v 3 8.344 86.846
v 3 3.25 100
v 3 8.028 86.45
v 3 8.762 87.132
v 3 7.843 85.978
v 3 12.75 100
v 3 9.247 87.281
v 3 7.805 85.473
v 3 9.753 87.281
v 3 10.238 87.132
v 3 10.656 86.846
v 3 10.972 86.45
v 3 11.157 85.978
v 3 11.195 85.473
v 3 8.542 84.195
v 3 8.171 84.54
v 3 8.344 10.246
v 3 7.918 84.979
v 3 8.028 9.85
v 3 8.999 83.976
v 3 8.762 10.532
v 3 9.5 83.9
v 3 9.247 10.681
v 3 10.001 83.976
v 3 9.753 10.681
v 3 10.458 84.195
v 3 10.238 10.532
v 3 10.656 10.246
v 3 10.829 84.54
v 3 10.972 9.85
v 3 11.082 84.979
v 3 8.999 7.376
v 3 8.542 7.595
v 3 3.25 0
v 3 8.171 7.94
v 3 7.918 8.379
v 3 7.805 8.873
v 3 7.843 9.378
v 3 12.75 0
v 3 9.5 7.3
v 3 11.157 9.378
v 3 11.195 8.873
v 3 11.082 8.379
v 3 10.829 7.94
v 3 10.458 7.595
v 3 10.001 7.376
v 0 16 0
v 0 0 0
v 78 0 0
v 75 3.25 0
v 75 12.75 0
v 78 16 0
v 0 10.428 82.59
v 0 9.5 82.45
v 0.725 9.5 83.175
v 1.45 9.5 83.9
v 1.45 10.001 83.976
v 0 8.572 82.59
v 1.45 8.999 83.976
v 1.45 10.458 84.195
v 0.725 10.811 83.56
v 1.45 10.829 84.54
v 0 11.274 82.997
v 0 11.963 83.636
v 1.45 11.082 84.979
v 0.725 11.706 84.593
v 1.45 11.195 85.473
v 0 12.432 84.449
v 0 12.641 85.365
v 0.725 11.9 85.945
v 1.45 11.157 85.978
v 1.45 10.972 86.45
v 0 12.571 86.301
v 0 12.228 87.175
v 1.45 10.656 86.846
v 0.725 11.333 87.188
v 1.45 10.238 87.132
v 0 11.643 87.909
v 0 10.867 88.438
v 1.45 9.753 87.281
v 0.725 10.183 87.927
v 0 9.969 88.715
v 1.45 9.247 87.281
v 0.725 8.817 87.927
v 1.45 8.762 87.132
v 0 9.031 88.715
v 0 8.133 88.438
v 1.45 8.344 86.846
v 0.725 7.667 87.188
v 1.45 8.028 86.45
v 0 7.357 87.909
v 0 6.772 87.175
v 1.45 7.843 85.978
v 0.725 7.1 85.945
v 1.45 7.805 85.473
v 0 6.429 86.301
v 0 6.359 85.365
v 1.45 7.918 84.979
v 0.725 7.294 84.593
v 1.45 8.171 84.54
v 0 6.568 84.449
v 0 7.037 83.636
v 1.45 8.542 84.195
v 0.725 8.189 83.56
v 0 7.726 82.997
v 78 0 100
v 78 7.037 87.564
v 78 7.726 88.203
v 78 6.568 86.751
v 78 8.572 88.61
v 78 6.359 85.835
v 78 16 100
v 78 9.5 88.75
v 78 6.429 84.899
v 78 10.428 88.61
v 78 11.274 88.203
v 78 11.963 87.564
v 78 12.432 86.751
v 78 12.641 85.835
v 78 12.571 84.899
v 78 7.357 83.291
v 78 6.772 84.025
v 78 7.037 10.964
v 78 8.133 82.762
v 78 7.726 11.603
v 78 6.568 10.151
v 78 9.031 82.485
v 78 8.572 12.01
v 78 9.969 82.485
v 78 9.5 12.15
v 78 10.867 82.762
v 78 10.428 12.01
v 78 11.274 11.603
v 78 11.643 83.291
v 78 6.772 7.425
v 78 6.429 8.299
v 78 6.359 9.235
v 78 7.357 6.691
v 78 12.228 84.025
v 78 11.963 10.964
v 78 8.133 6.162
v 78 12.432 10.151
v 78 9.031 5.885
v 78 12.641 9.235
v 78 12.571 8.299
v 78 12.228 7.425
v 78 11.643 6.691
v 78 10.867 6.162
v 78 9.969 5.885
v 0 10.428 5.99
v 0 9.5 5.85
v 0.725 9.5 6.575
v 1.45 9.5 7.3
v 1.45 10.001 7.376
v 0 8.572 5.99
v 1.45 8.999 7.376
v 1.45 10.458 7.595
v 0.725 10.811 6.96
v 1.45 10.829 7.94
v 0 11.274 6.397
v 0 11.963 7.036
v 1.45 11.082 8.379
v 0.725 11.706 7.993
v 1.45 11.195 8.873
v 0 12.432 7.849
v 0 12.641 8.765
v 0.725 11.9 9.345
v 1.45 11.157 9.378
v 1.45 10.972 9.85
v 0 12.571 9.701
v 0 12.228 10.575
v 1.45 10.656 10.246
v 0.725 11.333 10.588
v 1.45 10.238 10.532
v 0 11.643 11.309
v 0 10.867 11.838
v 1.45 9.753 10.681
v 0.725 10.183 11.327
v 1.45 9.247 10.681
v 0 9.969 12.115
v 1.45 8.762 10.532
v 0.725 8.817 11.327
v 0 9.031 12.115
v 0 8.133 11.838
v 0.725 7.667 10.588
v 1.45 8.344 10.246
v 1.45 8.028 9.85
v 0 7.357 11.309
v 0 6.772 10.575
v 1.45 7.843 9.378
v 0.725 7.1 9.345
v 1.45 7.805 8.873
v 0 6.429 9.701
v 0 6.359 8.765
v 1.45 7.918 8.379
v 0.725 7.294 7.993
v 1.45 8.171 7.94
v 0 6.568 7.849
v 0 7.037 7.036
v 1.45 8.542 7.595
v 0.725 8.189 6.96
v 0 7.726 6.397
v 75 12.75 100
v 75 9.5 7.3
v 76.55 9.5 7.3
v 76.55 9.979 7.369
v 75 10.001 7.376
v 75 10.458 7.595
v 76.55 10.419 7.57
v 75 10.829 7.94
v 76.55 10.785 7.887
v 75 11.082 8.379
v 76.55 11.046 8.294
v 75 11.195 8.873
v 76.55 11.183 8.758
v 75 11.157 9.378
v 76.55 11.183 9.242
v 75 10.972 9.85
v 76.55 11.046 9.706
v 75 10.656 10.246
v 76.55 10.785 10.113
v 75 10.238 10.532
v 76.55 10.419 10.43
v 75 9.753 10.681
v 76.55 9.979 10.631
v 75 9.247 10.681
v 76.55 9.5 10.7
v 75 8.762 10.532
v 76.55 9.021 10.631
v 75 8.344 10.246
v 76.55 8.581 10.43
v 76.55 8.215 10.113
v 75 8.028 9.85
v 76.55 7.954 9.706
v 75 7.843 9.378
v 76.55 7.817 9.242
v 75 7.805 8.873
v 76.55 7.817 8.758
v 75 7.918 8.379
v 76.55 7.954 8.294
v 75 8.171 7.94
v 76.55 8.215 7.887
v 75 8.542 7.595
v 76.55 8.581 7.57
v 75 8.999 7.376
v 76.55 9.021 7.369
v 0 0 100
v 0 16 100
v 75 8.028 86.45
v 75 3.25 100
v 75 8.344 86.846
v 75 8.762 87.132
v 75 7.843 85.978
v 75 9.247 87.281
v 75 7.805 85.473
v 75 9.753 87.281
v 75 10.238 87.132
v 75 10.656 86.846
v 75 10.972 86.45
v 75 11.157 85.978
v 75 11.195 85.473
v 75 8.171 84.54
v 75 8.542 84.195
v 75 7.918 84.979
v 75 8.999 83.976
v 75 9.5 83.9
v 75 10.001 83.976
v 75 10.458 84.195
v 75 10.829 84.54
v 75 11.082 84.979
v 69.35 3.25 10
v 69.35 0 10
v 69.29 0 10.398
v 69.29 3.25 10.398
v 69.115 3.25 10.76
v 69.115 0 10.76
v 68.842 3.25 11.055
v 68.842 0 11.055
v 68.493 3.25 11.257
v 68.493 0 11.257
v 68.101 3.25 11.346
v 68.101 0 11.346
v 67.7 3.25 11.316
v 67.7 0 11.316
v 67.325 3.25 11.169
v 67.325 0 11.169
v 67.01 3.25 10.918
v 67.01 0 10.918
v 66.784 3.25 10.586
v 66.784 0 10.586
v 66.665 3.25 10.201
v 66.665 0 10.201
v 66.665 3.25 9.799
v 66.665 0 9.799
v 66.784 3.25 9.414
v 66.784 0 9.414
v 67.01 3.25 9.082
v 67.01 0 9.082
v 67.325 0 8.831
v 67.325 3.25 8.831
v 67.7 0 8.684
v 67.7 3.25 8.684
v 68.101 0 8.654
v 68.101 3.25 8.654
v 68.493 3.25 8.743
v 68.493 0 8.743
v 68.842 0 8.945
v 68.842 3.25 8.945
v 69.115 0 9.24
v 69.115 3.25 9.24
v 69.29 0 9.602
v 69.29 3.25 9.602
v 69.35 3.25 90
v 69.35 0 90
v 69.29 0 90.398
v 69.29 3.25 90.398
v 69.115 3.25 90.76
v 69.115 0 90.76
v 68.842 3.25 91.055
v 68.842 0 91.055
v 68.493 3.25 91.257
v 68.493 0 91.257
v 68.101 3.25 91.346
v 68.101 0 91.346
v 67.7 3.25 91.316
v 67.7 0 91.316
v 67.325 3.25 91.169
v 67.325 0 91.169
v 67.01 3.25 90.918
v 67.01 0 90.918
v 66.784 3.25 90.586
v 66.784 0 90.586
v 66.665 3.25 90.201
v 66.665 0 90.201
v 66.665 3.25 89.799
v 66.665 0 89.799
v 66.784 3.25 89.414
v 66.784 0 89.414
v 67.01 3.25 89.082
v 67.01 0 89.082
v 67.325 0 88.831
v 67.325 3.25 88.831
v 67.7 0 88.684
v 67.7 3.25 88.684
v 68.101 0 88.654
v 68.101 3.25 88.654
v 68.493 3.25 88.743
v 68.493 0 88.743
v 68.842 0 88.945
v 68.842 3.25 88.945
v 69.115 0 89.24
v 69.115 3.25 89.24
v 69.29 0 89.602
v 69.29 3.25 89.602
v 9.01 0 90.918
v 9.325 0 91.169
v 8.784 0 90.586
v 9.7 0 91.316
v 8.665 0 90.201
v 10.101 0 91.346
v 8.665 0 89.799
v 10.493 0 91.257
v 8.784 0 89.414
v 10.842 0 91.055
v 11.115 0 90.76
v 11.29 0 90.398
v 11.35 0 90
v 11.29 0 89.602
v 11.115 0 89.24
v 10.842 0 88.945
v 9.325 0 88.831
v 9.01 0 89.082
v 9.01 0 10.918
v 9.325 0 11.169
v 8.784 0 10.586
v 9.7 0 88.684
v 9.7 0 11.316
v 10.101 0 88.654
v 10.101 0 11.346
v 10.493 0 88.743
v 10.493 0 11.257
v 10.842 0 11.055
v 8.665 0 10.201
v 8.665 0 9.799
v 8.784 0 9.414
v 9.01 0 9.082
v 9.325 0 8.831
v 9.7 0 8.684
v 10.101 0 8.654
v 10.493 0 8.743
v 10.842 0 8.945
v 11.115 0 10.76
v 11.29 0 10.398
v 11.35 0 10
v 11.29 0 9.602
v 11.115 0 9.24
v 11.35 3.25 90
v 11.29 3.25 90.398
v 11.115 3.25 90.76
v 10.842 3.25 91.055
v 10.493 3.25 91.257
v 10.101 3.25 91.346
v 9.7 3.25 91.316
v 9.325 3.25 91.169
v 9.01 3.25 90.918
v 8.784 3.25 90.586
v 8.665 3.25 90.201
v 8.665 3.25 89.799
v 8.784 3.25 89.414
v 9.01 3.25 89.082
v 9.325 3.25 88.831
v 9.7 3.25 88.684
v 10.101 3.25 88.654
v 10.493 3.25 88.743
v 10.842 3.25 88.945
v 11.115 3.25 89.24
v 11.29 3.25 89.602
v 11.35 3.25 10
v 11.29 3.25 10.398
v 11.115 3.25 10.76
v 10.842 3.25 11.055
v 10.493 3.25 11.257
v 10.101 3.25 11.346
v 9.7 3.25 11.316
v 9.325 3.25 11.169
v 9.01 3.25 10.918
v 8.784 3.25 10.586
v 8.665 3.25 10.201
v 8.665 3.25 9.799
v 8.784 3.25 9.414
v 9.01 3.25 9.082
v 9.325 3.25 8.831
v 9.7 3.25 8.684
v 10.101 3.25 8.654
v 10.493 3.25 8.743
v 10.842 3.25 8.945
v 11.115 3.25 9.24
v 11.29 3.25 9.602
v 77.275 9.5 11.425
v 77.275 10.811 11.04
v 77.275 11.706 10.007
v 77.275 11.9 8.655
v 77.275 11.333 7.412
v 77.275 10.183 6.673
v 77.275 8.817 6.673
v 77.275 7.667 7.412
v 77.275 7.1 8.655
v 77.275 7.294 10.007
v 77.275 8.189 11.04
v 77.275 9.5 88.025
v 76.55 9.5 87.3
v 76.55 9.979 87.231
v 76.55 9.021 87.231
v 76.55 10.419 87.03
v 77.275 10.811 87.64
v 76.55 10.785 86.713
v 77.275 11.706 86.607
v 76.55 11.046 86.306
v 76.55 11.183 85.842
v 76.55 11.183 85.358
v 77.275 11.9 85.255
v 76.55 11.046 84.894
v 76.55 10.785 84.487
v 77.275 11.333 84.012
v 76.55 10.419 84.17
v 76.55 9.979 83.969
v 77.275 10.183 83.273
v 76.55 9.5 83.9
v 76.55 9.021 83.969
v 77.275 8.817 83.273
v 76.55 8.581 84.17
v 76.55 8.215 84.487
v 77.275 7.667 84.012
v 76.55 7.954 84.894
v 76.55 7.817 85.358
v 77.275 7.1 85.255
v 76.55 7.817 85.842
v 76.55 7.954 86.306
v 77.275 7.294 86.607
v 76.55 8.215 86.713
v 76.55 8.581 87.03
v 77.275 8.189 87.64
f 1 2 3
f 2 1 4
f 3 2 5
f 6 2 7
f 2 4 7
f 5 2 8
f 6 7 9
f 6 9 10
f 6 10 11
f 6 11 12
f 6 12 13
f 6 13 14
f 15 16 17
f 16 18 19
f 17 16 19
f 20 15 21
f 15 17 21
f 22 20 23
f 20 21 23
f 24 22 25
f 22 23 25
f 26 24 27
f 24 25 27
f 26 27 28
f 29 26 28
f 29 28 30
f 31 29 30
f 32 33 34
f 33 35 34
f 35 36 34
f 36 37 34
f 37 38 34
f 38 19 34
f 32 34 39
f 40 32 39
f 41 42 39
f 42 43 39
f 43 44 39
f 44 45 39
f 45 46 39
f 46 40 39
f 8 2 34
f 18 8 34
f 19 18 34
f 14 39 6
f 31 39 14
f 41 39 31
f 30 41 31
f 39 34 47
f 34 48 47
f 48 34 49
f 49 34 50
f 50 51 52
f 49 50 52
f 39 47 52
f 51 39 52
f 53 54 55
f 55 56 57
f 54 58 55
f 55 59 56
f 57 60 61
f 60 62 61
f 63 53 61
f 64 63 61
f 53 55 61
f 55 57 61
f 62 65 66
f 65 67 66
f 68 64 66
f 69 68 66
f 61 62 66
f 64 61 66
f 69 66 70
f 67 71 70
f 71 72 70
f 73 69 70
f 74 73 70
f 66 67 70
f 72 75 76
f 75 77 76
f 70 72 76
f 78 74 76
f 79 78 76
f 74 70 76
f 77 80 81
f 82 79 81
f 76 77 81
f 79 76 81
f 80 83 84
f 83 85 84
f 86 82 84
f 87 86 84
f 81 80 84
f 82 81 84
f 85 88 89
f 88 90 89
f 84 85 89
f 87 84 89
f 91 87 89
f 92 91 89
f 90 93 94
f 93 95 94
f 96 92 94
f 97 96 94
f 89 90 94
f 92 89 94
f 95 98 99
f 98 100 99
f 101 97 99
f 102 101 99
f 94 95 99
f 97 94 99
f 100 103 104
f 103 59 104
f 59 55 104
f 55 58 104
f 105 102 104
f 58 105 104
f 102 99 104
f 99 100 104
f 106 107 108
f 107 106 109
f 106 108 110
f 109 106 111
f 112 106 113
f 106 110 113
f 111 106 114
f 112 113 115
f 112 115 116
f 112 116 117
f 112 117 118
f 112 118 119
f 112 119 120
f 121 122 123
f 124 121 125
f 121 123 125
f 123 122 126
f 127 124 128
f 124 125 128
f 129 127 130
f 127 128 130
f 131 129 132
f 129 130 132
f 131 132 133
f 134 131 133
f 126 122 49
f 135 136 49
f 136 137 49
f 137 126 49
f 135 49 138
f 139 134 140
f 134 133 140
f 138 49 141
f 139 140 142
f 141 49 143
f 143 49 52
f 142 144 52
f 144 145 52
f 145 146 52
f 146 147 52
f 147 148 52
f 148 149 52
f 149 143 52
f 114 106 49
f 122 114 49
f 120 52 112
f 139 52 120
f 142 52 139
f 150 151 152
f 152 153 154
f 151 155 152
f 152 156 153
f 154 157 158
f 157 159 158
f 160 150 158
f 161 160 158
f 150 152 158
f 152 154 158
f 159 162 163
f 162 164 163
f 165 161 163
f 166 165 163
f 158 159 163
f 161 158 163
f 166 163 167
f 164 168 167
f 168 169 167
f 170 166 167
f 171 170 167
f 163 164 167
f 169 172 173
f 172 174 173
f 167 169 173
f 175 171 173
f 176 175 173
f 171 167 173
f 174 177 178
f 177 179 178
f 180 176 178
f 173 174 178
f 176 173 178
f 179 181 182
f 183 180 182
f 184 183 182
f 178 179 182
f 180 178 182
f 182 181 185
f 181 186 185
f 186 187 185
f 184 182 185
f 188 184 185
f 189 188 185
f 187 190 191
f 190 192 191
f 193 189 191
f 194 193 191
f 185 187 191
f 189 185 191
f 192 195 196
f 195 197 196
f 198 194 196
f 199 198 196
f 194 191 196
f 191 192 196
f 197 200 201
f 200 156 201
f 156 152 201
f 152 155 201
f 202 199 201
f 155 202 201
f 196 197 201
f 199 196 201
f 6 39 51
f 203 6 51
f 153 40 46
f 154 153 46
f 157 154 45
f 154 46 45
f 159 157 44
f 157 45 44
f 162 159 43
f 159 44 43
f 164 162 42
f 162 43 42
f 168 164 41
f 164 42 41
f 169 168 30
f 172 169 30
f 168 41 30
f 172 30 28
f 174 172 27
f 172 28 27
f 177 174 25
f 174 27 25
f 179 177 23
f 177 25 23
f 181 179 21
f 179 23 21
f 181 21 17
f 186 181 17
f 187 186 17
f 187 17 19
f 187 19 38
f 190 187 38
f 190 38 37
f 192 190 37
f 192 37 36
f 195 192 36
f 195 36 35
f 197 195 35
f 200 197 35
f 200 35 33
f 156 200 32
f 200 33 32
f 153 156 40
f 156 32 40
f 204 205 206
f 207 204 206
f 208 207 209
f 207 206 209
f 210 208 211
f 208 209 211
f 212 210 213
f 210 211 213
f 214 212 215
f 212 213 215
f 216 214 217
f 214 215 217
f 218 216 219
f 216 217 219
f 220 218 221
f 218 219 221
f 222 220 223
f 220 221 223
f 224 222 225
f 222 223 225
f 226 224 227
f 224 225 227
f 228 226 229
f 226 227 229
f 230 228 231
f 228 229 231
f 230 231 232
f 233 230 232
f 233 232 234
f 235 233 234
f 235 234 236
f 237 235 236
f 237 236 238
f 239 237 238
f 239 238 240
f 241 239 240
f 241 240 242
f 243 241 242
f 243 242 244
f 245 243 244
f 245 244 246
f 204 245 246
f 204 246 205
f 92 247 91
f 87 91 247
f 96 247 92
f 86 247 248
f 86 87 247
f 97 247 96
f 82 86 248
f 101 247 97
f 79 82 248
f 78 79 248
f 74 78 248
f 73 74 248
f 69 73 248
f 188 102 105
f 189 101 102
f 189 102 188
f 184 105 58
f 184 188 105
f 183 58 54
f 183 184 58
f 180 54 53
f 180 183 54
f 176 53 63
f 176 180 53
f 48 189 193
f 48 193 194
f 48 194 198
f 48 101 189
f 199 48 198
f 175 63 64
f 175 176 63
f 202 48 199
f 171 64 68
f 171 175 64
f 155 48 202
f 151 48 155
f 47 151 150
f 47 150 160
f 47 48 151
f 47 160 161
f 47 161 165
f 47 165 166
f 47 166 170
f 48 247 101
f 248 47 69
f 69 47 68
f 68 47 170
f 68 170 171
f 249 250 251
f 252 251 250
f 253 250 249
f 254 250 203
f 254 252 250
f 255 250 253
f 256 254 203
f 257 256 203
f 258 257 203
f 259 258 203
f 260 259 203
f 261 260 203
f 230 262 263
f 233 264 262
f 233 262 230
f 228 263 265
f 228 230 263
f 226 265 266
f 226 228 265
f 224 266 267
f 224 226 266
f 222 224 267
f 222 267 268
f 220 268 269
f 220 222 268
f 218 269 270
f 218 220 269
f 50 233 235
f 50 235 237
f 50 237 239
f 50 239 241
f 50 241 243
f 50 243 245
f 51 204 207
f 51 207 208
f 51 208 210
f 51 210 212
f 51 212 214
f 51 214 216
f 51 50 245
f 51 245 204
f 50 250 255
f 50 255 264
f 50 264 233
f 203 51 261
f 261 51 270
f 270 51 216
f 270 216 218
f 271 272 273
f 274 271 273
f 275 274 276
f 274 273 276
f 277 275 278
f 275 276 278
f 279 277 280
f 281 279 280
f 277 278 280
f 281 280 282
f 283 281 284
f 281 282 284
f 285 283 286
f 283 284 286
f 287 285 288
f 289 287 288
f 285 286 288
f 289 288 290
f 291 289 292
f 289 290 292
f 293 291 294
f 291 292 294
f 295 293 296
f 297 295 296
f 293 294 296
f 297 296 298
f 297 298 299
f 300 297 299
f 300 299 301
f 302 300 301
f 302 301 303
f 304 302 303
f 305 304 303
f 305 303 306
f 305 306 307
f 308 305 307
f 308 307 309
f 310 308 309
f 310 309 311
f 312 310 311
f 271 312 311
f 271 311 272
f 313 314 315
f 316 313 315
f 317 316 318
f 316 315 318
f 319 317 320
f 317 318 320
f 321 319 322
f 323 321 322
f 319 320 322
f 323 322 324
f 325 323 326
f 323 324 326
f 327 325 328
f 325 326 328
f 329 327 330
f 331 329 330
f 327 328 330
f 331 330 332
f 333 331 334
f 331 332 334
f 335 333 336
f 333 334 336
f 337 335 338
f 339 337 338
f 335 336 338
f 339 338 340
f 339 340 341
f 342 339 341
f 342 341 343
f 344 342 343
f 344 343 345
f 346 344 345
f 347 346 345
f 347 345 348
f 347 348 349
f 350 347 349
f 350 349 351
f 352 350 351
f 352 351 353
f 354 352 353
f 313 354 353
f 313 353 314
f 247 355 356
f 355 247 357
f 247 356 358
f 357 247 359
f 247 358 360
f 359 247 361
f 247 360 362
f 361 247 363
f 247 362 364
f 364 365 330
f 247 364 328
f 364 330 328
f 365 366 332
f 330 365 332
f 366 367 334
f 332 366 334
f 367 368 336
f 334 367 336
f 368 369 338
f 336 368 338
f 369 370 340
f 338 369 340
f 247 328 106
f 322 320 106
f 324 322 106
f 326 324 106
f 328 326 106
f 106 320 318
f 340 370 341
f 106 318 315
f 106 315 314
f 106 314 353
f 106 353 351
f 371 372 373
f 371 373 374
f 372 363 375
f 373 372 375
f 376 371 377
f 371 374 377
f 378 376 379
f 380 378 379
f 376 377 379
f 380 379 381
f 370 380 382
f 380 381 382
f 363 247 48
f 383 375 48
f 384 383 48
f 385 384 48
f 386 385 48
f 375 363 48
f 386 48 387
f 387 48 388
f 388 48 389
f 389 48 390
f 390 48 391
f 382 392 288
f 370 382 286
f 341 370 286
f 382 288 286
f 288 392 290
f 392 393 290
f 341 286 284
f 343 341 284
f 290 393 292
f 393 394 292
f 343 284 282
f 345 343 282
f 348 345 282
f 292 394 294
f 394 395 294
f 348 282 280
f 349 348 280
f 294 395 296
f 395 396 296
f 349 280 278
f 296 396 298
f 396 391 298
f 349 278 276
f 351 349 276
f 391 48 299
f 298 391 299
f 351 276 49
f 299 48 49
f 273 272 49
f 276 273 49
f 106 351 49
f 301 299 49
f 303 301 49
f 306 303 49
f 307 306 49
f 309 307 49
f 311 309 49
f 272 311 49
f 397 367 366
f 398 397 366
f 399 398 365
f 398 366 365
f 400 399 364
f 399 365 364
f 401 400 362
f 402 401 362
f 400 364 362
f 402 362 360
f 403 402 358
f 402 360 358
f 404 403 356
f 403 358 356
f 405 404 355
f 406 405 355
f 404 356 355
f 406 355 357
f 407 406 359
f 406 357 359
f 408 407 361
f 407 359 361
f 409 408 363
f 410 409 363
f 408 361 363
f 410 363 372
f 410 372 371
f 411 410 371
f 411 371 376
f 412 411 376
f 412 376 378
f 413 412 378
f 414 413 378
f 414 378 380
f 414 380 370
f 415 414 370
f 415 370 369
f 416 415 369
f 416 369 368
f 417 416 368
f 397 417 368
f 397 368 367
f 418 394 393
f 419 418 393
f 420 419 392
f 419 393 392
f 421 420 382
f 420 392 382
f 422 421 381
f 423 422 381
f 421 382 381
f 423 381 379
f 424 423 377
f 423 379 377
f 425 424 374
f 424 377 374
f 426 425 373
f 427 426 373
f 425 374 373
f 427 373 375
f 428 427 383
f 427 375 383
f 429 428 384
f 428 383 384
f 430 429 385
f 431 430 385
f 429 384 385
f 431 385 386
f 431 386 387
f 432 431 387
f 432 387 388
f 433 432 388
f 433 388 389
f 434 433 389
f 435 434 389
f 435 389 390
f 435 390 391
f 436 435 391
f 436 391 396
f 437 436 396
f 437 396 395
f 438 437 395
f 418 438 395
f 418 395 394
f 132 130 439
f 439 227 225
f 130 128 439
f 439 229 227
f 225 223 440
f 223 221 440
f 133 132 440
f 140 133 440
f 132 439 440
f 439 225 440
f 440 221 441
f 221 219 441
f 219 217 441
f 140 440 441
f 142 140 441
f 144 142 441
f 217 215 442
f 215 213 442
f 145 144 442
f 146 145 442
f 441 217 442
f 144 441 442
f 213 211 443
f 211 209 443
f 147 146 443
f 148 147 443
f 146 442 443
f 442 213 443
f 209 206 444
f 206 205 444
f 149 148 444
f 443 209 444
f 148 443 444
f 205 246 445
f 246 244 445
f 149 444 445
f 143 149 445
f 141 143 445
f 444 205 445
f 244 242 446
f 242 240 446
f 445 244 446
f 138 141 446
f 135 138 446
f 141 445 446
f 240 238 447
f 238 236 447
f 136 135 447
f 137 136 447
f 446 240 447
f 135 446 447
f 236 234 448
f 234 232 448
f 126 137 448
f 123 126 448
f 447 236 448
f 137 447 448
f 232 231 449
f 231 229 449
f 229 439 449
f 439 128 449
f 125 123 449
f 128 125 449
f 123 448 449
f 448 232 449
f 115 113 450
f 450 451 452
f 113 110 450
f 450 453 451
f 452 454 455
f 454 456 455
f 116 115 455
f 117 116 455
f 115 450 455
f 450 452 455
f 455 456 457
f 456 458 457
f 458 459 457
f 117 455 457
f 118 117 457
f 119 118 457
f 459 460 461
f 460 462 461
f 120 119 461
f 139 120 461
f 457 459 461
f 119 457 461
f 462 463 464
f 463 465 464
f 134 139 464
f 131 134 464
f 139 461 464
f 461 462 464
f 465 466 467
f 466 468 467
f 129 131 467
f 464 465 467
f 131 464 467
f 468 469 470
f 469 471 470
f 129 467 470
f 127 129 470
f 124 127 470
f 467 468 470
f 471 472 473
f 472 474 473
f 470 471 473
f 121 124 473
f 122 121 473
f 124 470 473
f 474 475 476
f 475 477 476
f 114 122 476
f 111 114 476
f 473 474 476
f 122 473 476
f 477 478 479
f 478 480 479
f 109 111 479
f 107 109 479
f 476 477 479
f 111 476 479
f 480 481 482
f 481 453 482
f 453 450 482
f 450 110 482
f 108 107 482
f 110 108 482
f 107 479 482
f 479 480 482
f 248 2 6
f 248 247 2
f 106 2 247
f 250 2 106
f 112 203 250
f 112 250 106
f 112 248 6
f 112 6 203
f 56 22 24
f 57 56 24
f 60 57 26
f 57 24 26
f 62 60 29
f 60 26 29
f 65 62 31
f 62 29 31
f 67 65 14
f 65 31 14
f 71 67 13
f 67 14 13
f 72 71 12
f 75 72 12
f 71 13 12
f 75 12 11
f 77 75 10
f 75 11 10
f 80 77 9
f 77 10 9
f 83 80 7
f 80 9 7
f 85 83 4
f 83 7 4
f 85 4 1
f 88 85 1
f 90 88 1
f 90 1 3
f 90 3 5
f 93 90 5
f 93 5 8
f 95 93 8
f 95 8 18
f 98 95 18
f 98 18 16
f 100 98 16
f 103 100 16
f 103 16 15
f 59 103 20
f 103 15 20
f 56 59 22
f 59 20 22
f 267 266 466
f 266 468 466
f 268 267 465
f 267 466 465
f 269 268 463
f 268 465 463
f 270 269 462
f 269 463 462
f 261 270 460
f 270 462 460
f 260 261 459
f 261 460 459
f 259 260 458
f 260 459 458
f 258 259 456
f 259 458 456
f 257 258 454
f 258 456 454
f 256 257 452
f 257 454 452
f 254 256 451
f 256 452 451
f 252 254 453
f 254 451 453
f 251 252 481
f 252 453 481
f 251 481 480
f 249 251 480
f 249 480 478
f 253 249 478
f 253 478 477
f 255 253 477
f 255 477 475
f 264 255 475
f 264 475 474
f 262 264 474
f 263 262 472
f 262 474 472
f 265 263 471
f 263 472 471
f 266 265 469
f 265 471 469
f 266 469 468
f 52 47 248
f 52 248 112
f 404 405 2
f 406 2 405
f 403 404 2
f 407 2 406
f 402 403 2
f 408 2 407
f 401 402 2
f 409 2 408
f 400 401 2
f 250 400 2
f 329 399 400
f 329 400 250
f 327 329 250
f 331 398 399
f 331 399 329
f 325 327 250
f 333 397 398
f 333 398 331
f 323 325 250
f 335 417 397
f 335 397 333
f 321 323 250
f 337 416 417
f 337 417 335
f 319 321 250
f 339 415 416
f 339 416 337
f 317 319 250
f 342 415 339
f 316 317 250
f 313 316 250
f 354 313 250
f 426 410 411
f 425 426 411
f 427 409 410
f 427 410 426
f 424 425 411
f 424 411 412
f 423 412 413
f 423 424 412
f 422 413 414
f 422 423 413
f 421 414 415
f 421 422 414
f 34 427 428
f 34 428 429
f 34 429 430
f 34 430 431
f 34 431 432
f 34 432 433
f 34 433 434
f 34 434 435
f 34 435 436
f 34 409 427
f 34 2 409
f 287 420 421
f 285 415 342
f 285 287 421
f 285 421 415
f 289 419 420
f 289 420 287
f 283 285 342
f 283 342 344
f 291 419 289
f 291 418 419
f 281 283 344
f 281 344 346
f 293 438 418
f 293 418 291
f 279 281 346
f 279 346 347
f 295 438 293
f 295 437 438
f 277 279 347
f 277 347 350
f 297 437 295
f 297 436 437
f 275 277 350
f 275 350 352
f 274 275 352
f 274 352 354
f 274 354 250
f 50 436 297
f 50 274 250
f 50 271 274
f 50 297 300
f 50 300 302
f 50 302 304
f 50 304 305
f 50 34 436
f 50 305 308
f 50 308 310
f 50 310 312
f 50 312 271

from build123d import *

# Parameters (mm, degrees)
MAIN_SKETCH_W                                  = 78
MAIN_SKETCH_H                                  = 16
MAIN_SKETCH_W_2                                = 72
MAIN_SKETCH_H_2                                = 9.5
MAIN_EXTRUSION_DEPTH                           = 100
FRAISAGE_POUR_VIS_T_TE_FRAIS_E_M31_D           = 3.4
FRAISAGE_POUR_VIS_T_TE_FRAIS_E_M31_CSINK_D     = 6.3
FRAISAGE_POUR_VIS_T_TE_FRAIS_E_M31_CSINK_ANGLE = 90
R_P_TITION_LIN_AIRE1_COUNT                     = 2
R_P_TITION_LIN_AIRE1_PITCH                     = 76.6
FRAISAGE_POUR_VIS_T_TE_FRAIS_E_M32_D           = 3.4
FRAISAGE_POUR_VIS_T_TE_FRAIS_E_M32_CSINK_D     = 6.3
FRAISAGE_POUR_VIS_T_TE_FRAIS_E_M32_CSINK_ANGLE = 90
R_P_TITION_LIN_AIRE3_COUNT                     = 2
R_P_TITION_LIN_AIRE3_PITCH                     = 76.5
FRAISAGE_POUR_VIS_T_TE_FRAIS_E_M33_D           = 3.4
FRAISAGE_POUR_VIS_T_TE_FRAIS_E_M33_CSINK_D     = 6.3
FRAISAGE_POUR_VIS_T_TE_FRAIS_E_M33_CSINK_ANGLE = 90
SUPPORT_FIX_HOLE_REACH                         = 18
SUPPORT_FIX_SKETCH_R                           = 1.35


with BuildPart() as part:
    # Main-Sketch → Main-Extrusion (new body)
    with BuildSketch(Plane.XY):
        with Locations((39, 8)):
            Rectangle(MAIN_SKETCH_W, MAIN_SKETCH_H)
        with Locations((39, 8)):
            Rectangle(MAIN_SKETCH_W_2, MAIN_SKETCH_H_2, mode=Mode.SUBTRACT)
    extrude(amount=MAIN_EXTRUSION_DEPTH)

    # Fraisage pour vis à tête fraisée M31 (through all)
    with Locations(Plane.ZY):
        with Locations((9, 9.5)):
            fraisage_pour_vis_t_te_frais_e_m31 = CounterSinkHole(FRAISAGE_POUR_VIS_T_TE_FRAIS_E_M31_D / 2, FRAISAGE_POUR_VIS_T_TE_FRAIS_E_M31_CSINK_D / 2, counter_sink_angle=FRAISAGE_POUR_VIS_T_TE_FRAIS_E_M31_CSINK_ANGLE)

    # Répétition linéaire1: Fraisage pour vis à tête fraisée M31 ×2
    with Locations(*[(0, 0, i * R_P_TITION_LIN_AIRE1_PITCH) for i in range(1, R_P_TITION_LIN_AIRE1_COUNT)]):
        add(fraisage_pour_vis_t_te_frais_e_m31, mode=Mode.SUBTRACT)

    # Fraisage pour vis à tête fraisée M32 (through all)
    with Locations(Plane(origin=(78, 0, 0), x_dir=(0, 0, -1), z_dir=(1, 0, 0))):
        with Locations((-85.6, 9.5)):
            fraisage_pour_vis_t_te_frais_e_m32 = CounterSinkHole(FRAISAGE_POUR_VIS_T_TE_FRAIS_E_M32_D / 2, FRAISAGE_POUR_VIS_T_TE_FRAIS_E_M32_CSINK_D / 2, counter_sink_angle=FRAISAGE_POUR_VIS_T_TE_FRAIS_E_M32_CSINK_ANGLE)

    # Répétition linéaire3: Fraisage pour vis à tête fraisée M32 ×2
    with Locations(*[(i * R_P_TITION_LIN_AIRE3_PITCH, 0, 0) for i in range(1, R_P_TITION_LIN_AIRE3_COUNT)]):
        add(fraisage_pour_vis_t_te_frais_e_m32, mode=Mode.SUBTRACT)

    # Fraisage pour vis à tête fraisée M33 (through all)
    with Locations(Plane(origin=(78, 0, 0), x_dir=(0, 0, -1), z_dir=(1, 0, 0))):
        with Locations((-9, 9.5)):
            CounterSinkHole(FRAISAGE_POUR_VIS_T_TE_FRAIS_E_M33_D / 2, FRAISAGE_POUR_VIS_T_TE_FRAIS_E_M33_CSINK_D / 2, counter_sink_angle=FRAISAGE_POUR_VIS_T_TE_FRAIS_E_M33_CSINK_ANGLE)

    # Support-Fix-Sketch → Support-Fix-Hole (cut, up to next)
    with BuildSketch(Plane.XZ, mode=Mode.PRIVATE) as support_fix_hole_sk1:
        with Locations((68, 90)):
            Circle(SUPPORT_FIX_SKETCH_R)
    support_fix_hole_tool1 = extrude(support_fix_hole_sk1.sketch, amount=-SUPPORT_FIX_HOLE_REACH, mode=Mode.PRIVATE) & part.part
    add(support_fix_hole_tool1.solids().sort_by_distance((68, 0, 90))[0], mode=Mode.SUBTRACT)
    # Support-Fix-Sketch → Support-Fix-Hole (cut, up to next)
    with BuildSketch(Plane.XZ, mode=Mode.PRIVATE) as support_fix_hole_sk2:
        with Locations((68, 10)):
            Circle(SUPPORT_FIX_SKETCH_R)
    support_fix_hole_tool2 = extrude(support_fix_hole_sk2.sketch, amount=-SUPPORT_FIX_HOLE_REACH, mode=Mode.PRIVATE) & part.part
    add(support_fix_hole_tool2.solids().sort_by_distance((68, 0, 10))[0], mode=Mode.SUBTRACT)
    # Support-Fix-Sketch → Support-Fix-Hole (cut, up to next)
    with BuildSketch(Plane.XZ, mode=Mode.PRIVATE) as support_fix_hole_sk3:
        with Locations((10, 10)):
            Circle(SUPPORT_FIX_SKETCH_R)
    support_fix_hole_tool3 = extrude(support_fix_hole_sk3.sketch, amount=-SUPPORT_FIX_HOLE_REACH, mode=Mode.PRIVATE) & part.part
    add(support_fix_hole_tool3.solids().sort_by_distance((10, 0, 10))[0], mode=Mode.SUBTRACT)
    # Support-Fix-Sketch → Support-Fix-Hole (cut, up to next)
    with BuildSketch(Plane.XZ, mode=Mode.PRIVATE) as support_fix_hole_sk4:
        with Locations((10, 90)):
            Circle(SUPPORT_FIX_SKETCH_R)
    support_fix_hole_tool4 = extrude(support_fix_hole_sk4.sketch, amount=-SUPPORT_FIX_HOLE_REACH, mode=Mode.PRIVATE) & part.part
    add(support_fix_hole_tool4.solids().sort_by_distance((10, 0, 90))[0], mode=Mode.SUBTRACT)


solid = part.part
